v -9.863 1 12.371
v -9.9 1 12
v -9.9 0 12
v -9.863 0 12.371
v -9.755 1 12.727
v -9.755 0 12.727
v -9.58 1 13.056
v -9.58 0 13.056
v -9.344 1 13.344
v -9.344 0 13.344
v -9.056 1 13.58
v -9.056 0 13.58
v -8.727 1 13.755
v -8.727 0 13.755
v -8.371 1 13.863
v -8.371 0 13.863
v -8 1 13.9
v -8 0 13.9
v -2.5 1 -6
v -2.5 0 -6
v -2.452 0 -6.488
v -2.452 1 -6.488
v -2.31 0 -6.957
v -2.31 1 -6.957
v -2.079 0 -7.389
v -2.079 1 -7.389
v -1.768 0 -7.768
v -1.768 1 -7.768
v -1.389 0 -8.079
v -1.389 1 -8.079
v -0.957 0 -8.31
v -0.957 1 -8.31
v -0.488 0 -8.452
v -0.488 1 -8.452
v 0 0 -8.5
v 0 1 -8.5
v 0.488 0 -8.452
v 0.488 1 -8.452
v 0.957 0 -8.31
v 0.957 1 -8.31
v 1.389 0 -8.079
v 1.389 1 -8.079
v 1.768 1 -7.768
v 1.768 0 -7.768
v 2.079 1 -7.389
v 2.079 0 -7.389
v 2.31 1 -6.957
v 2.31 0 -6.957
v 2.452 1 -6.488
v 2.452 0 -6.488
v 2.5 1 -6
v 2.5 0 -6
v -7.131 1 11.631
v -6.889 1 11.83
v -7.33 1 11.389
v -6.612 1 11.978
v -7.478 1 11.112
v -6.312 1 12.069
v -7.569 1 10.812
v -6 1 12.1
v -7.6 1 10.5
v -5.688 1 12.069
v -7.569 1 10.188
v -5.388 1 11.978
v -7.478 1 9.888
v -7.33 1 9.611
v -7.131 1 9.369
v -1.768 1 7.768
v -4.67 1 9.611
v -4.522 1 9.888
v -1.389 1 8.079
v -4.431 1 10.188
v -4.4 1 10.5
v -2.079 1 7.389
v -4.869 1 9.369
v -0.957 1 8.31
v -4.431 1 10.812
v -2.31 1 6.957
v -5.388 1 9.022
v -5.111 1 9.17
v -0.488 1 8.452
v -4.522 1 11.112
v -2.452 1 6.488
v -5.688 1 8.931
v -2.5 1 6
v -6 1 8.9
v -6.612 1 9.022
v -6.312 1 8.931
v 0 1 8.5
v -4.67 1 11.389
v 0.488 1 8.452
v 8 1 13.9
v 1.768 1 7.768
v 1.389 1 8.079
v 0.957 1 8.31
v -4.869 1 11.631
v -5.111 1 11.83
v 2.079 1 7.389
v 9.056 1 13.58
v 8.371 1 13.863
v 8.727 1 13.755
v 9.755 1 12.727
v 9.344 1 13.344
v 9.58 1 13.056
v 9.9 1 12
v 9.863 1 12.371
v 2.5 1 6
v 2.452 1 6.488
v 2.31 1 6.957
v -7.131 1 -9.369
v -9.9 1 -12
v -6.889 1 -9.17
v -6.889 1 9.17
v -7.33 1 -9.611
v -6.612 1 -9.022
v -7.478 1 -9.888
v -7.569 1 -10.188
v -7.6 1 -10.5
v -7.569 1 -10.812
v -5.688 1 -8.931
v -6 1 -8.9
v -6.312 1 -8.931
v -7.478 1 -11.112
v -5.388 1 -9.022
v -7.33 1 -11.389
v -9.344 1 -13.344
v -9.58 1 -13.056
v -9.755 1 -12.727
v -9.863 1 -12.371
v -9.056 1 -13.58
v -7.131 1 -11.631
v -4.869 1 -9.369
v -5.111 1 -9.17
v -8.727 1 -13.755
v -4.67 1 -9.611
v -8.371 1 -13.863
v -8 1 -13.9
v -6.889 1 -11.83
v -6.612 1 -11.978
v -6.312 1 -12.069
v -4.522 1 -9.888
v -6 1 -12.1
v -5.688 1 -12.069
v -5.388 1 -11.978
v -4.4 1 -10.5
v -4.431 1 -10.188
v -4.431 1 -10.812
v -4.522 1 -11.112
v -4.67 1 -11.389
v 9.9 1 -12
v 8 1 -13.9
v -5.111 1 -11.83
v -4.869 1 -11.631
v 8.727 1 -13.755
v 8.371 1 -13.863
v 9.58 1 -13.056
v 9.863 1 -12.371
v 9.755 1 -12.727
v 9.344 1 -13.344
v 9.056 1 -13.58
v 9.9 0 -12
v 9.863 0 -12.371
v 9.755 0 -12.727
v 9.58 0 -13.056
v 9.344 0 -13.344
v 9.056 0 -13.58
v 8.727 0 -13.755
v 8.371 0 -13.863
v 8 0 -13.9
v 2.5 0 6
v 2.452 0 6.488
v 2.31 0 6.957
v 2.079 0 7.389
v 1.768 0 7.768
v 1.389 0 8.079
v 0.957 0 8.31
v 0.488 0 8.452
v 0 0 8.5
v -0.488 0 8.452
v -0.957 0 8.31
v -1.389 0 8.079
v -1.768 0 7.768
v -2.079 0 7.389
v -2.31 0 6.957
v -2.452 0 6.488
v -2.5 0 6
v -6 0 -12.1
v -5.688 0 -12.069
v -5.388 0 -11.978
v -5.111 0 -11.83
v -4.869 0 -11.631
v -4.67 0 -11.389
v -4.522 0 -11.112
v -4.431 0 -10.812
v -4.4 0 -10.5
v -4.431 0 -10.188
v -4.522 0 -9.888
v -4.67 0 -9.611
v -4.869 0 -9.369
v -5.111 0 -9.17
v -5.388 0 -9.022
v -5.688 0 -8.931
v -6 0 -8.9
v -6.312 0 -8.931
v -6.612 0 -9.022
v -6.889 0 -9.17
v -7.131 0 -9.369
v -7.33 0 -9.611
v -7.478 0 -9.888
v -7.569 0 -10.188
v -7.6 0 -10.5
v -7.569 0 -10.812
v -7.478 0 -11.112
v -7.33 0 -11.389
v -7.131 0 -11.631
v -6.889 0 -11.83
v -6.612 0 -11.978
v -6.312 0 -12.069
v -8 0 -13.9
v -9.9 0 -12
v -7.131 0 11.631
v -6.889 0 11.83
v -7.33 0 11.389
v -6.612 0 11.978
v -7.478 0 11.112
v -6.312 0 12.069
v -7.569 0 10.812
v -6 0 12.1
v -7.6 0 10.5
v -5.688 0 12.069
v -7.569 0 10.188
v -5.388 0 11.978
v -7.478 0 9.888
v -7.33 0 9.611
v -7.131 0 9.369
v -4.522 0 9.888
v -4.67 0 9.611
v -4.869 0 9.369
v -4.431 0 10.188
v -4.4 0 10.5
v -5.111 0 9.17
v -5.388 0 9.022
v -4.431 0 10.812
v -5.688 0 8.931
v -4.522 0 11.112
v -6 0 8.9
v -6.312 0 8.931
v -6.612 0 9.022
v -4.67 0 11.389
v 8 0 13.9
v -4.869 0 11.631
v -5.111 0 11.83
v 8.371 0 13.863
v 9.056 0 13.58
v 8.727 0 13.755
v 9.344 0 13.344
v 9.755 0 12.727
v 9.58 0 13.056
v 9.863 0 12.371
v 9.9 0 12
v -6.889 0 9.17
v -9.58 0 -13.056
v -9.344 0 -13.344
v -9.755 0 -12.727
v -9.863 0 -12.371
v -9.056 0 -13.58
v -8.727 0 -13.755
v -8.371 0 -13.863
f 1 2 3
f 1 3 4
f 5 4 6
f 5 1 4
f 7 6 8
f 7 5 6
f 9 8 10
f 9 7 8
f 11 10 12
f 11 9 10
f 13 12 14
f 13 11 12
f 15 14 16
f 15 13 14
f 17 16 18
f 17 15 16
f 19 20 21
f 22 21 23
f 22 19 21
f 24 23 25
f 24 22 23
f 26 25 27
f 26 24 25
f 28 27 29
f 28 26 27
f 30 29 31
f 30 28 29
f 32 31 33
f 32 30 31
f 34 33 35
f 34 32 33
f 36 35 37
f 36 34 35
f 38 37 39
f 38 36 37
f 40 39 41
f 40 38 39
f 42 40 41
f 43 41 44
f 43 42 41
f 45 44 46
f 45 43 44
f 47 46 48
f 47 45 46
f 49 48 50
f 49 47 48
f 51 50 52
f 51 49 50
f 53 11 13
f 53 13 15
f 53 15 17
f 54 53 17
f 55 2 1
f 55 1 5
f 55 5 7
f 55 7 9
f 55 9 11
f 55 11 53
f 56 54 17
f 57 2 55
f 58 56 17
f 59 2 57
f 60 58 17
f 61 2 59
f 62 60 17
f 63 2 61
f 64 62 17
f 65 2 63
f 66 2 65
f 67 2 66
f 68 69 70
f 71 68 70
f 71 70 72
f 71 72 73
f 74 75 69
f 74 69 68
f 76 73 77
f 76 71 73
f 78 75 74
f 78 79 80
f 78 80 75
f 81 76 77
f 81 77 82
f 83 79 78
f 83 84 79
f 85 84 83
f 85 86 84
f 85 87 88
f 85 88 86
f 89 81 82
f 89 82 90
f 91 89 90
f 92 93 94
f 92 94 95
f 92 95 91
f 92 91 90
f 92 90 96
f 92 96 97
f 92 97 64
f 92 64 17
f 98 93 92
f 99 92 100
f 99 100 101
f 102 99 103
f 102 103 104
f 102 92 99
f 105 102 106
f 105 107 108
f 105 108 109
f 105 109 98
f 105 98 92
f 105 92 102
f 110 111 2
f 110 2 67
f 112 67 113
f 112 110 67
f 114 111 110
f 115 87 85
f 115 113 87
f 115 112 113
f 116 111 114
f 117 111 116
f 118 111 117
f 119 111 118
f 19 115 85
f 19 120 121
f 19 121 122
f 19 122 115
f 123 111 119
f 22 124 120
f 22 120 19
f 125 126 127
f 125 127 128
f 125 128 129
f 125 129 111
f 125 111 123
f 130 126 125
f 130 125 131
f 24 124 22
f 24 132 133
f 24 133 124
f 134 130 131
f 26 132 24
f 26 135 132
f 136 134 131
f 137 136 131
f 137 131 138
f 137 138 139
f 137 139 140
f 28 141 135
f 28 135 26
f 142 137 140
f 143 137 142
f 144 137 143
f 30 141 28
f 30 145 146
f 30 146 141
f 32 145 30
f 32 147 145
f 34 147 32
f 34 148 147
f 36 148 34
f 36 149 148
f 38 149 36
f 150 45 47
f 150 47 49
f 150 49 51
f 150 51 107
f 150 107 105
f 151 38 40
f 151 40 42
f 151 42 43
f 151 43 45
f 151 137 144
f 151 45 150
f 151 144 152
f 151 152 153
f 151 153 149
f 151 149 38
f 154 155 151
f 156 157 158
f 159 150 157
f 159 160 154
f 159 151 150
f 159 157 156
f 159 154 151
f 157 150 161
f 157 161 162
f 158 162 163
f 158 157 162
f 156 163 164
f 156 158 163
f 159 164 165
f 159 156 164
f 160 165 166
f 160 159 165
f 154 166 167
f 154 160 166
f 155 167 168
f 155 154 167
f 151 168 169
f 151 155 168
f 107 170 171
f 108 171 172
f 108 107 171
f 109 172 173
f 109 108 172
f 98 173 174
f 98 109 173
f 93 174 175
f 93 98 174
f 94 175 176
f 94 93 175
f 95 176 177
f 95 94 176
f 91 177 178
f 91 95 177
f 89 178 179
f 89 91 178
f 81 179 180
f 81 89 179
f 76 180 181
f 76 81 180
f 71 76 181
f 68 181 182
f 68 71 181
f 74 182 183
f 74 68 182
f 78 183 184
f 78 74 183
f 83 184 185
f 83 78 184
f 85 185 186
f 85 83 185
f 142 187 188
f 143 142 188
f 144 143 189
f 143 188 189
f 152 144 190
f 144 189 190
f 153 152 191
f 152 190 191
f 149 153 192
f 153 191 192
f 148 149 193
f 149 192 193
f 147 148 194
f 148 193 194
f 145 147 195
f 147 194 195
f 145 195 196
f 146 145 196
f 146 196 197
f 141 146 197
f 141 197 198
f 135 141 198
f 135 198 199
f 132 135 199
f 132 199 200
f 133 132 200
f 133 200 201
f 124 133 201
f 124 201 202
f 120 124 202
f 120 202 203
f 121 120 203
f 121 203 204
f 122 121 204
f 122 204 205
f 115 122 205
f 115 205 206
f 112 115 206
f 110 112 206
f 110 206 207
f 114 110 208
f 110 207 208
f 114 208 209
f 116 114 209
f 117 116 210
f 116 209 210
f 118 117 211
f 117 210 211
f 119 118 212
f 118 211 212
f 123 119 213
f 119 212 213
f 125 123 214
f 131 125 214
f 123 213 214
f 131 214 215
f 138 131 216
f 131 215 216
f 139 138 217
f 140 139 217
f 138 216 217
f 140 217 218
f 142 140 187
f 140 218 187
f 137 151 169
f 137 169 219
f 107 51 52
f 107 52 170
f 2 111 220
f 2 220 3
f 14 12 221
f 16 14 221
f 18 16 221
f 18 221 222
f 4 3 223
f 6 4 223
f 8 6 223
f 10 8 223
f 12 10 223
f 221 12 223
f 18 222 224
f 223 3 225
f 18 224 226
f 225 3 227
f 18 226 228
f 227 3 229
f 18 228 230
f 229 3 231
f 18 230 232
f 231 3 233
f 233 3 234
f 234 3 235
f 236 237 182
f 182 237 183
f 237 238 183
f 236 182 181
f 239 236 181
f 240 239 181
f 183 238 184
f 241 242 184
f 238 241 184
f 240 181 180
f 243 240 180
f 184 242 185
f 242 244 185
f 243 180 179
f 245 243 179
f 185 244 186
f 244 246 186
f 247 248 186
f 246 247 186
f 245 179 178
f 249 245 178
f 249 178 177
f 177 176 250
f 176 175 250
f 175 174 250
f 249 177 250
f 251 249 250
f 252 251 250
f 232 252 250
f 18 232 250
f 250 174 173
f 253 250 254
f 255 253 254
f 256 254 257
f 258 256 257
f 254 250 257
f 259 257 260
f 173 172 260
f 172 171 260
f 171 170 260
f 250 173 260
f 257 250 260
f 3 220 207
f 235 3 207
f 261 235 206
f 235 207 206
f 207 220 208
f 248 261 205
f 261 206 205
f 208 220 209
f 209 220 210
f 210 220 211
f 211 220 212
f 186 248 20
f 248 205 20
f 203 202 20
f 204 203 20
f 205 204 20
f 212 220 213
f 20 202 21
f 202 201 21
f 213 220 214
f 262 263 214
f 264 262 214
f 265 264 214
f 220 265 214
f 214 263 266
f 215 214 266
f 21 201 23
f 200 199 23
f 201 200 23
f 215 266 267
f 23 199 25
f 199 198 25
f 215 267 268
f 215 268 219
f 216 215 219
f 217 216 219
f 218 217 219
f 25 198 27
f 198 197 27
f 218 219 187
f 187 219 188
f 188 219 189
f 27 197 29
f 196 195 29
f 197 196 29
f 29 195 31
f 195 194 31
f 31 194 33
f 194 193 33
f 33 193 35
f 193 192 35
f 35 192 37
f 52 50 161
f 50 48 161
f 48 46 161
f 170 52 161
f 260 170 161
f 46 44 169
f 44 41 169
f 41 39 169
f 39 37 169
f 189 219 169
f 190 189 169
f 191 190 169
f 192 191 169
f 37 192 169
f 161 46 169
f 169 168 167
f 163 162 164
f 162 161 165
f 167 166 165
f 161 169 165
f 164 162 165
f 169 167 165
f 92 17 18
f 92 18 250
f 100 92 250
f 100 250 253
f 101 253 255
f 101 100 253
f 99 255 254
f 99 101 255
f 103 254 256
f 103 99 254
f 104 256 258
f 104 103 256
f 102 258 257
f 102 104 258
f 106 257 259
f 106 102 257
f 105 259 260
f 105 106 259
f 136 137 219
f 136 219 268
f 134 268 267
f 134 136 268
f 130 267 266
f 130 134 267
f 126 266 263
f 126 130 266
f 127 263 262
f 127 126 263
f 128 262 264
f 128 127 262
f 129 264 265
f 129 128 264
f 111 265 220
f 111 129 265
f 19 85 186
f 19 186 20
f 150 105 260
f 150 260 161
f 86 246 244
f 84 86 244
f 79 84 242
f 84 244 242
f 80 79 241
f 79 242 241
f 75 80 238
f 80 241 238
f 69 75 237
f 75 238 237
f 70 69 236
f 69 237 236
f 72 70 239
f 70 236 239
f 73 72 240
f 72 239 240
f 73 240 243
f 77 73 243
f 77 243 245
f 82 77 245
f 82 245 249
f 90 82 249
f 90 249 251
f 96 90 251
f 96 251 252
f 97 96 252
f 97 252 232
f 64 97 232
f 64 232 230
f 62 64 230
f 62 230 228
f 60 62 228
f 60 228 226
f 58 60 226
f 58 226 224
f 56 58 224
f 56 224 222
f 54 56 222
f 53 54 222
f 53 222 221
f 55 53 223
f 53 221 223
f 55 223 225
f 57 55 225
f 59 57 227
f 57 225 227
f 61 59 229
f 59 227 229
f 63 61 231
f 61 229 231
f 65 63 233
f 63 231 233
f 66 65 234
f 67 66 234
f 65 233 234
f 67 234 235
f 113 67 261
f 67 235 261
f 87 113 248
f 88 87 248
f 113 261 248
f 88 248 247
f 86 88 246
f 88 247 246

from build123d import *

# Parameters (mm, degrees)
SKETCH1_W           = 20
SKETCH1_H           = 28
BOSS_EXTRUDE1_DEPTH = 1
FILLET1_R           = 2
SKETCH2_W           = 25.473591578
SKETCH2_H           = 30.562755328
CUT_EXTRUDE1_DEPTH  = 18.23368794
SKETCH3_R           = 1.6
CUT_EXTRUDE2_DEPTH  = 18.094443542
CUT_EXTRUDE3_DEPTH  = 10


with BuildPart() as part:
    # Sketch1 → Boss-Extrude1 (new body)
    with BuildSketch(Plane(origin=(0, 0, 0), x_dir=(1, 0, 0), z_dir=(0, 1, 0))):
        Rectangle(SKETCH1_W, SKETCH1_H)
    extrude(amount=BOSS_EXTRUDE1_DEPTH)

    # Fillet1
    fillet1_edges = [part.edges().sort_by_distance(p)[0] for p in [
        (10, 0.5, 14),
        (-10, 0.5, 14),
        (-10, 0.5, -14),
        (10, 0.5, -14),
    ]]
    fillet(fillet1_edges, radius=FILLET1_R)

    # Sketch2 → Cut-Extrude1 (cut, through all)
    with BuildSketch(Plane(origin=(0, 1, 0), x_dir=(1, 0, 0), z_dir=(0, 1, 0))):
        Rectangle(SKETCH2_W, SKETCH2_H)
        with BuildLine():
            Line((-8, -13.9), (8, -13.9))
            ThreePointArc((8, -13.9), (9.343502884, -13.343502884), (9.9, -12))
            Line((9.9, -12), (9.9, 12))
            ThreePointArc((9.9, 12), (9.343502884, 13.343502884), (8, 13.9))
            Line((8, 13.9), (-8, 13.9))
            ThreePointArc((-8, 13.9), (-9.343502884, 13.343502884), (-9.9, 12))
            Line((-9.9, 12), (-9.9, -12))
            ThreePointArc((-9.9, -12), (-9.343502884, -13.343502884), (-8, -13.9))
        make_face(mode=Mode.SUBTRACT)
    extrude(amount=-CUT_EXTRUDE1_DEPTH, mode=Mode.SUBTRACT)

    # Sketch3 → Cut-Extrude2 (cut, through all)
    with BuildSketch(Plane(origin=(0, 0, 0), x_dir=(-1, 0, 0), z_dir=(0, -1, 0))):
        with Locations(Location((6, -10.5, 0), (0, 0, 90))):
            Circle(SKETCH3_R)
        with Locations(Location((6, 10.5, 0), (0, 0, 90))):
            Circle(SKETCH3_R)
    extrude(amount=-CUT_EXTRUDE2_DEPTH, mode=Mode.SUBTRACT)

    # Sketch4 → Cut-Extrude3 (cut)
    with BuildSketch(Plane(origin=(0, 1, 0), x_dir=(1, 0, 0), z_dir=(0, 1, 0))):
        with BuildLine():
            Line((2.5, 6), (2.5, -6))
            ThreePointArc((2.5, -6), (0, -8.5), (-2.5, -6))
            Line((-2.5, -6), (-2.5, 6))
            ThreePointArc((-2.5, 6), (0, 8.5), (2.5, 6))
        make_face()
    extrude(amount=-CUT_EXTRUDE3_DEPTH, mode=Mode.SUBTRACT)


solid = part.part
